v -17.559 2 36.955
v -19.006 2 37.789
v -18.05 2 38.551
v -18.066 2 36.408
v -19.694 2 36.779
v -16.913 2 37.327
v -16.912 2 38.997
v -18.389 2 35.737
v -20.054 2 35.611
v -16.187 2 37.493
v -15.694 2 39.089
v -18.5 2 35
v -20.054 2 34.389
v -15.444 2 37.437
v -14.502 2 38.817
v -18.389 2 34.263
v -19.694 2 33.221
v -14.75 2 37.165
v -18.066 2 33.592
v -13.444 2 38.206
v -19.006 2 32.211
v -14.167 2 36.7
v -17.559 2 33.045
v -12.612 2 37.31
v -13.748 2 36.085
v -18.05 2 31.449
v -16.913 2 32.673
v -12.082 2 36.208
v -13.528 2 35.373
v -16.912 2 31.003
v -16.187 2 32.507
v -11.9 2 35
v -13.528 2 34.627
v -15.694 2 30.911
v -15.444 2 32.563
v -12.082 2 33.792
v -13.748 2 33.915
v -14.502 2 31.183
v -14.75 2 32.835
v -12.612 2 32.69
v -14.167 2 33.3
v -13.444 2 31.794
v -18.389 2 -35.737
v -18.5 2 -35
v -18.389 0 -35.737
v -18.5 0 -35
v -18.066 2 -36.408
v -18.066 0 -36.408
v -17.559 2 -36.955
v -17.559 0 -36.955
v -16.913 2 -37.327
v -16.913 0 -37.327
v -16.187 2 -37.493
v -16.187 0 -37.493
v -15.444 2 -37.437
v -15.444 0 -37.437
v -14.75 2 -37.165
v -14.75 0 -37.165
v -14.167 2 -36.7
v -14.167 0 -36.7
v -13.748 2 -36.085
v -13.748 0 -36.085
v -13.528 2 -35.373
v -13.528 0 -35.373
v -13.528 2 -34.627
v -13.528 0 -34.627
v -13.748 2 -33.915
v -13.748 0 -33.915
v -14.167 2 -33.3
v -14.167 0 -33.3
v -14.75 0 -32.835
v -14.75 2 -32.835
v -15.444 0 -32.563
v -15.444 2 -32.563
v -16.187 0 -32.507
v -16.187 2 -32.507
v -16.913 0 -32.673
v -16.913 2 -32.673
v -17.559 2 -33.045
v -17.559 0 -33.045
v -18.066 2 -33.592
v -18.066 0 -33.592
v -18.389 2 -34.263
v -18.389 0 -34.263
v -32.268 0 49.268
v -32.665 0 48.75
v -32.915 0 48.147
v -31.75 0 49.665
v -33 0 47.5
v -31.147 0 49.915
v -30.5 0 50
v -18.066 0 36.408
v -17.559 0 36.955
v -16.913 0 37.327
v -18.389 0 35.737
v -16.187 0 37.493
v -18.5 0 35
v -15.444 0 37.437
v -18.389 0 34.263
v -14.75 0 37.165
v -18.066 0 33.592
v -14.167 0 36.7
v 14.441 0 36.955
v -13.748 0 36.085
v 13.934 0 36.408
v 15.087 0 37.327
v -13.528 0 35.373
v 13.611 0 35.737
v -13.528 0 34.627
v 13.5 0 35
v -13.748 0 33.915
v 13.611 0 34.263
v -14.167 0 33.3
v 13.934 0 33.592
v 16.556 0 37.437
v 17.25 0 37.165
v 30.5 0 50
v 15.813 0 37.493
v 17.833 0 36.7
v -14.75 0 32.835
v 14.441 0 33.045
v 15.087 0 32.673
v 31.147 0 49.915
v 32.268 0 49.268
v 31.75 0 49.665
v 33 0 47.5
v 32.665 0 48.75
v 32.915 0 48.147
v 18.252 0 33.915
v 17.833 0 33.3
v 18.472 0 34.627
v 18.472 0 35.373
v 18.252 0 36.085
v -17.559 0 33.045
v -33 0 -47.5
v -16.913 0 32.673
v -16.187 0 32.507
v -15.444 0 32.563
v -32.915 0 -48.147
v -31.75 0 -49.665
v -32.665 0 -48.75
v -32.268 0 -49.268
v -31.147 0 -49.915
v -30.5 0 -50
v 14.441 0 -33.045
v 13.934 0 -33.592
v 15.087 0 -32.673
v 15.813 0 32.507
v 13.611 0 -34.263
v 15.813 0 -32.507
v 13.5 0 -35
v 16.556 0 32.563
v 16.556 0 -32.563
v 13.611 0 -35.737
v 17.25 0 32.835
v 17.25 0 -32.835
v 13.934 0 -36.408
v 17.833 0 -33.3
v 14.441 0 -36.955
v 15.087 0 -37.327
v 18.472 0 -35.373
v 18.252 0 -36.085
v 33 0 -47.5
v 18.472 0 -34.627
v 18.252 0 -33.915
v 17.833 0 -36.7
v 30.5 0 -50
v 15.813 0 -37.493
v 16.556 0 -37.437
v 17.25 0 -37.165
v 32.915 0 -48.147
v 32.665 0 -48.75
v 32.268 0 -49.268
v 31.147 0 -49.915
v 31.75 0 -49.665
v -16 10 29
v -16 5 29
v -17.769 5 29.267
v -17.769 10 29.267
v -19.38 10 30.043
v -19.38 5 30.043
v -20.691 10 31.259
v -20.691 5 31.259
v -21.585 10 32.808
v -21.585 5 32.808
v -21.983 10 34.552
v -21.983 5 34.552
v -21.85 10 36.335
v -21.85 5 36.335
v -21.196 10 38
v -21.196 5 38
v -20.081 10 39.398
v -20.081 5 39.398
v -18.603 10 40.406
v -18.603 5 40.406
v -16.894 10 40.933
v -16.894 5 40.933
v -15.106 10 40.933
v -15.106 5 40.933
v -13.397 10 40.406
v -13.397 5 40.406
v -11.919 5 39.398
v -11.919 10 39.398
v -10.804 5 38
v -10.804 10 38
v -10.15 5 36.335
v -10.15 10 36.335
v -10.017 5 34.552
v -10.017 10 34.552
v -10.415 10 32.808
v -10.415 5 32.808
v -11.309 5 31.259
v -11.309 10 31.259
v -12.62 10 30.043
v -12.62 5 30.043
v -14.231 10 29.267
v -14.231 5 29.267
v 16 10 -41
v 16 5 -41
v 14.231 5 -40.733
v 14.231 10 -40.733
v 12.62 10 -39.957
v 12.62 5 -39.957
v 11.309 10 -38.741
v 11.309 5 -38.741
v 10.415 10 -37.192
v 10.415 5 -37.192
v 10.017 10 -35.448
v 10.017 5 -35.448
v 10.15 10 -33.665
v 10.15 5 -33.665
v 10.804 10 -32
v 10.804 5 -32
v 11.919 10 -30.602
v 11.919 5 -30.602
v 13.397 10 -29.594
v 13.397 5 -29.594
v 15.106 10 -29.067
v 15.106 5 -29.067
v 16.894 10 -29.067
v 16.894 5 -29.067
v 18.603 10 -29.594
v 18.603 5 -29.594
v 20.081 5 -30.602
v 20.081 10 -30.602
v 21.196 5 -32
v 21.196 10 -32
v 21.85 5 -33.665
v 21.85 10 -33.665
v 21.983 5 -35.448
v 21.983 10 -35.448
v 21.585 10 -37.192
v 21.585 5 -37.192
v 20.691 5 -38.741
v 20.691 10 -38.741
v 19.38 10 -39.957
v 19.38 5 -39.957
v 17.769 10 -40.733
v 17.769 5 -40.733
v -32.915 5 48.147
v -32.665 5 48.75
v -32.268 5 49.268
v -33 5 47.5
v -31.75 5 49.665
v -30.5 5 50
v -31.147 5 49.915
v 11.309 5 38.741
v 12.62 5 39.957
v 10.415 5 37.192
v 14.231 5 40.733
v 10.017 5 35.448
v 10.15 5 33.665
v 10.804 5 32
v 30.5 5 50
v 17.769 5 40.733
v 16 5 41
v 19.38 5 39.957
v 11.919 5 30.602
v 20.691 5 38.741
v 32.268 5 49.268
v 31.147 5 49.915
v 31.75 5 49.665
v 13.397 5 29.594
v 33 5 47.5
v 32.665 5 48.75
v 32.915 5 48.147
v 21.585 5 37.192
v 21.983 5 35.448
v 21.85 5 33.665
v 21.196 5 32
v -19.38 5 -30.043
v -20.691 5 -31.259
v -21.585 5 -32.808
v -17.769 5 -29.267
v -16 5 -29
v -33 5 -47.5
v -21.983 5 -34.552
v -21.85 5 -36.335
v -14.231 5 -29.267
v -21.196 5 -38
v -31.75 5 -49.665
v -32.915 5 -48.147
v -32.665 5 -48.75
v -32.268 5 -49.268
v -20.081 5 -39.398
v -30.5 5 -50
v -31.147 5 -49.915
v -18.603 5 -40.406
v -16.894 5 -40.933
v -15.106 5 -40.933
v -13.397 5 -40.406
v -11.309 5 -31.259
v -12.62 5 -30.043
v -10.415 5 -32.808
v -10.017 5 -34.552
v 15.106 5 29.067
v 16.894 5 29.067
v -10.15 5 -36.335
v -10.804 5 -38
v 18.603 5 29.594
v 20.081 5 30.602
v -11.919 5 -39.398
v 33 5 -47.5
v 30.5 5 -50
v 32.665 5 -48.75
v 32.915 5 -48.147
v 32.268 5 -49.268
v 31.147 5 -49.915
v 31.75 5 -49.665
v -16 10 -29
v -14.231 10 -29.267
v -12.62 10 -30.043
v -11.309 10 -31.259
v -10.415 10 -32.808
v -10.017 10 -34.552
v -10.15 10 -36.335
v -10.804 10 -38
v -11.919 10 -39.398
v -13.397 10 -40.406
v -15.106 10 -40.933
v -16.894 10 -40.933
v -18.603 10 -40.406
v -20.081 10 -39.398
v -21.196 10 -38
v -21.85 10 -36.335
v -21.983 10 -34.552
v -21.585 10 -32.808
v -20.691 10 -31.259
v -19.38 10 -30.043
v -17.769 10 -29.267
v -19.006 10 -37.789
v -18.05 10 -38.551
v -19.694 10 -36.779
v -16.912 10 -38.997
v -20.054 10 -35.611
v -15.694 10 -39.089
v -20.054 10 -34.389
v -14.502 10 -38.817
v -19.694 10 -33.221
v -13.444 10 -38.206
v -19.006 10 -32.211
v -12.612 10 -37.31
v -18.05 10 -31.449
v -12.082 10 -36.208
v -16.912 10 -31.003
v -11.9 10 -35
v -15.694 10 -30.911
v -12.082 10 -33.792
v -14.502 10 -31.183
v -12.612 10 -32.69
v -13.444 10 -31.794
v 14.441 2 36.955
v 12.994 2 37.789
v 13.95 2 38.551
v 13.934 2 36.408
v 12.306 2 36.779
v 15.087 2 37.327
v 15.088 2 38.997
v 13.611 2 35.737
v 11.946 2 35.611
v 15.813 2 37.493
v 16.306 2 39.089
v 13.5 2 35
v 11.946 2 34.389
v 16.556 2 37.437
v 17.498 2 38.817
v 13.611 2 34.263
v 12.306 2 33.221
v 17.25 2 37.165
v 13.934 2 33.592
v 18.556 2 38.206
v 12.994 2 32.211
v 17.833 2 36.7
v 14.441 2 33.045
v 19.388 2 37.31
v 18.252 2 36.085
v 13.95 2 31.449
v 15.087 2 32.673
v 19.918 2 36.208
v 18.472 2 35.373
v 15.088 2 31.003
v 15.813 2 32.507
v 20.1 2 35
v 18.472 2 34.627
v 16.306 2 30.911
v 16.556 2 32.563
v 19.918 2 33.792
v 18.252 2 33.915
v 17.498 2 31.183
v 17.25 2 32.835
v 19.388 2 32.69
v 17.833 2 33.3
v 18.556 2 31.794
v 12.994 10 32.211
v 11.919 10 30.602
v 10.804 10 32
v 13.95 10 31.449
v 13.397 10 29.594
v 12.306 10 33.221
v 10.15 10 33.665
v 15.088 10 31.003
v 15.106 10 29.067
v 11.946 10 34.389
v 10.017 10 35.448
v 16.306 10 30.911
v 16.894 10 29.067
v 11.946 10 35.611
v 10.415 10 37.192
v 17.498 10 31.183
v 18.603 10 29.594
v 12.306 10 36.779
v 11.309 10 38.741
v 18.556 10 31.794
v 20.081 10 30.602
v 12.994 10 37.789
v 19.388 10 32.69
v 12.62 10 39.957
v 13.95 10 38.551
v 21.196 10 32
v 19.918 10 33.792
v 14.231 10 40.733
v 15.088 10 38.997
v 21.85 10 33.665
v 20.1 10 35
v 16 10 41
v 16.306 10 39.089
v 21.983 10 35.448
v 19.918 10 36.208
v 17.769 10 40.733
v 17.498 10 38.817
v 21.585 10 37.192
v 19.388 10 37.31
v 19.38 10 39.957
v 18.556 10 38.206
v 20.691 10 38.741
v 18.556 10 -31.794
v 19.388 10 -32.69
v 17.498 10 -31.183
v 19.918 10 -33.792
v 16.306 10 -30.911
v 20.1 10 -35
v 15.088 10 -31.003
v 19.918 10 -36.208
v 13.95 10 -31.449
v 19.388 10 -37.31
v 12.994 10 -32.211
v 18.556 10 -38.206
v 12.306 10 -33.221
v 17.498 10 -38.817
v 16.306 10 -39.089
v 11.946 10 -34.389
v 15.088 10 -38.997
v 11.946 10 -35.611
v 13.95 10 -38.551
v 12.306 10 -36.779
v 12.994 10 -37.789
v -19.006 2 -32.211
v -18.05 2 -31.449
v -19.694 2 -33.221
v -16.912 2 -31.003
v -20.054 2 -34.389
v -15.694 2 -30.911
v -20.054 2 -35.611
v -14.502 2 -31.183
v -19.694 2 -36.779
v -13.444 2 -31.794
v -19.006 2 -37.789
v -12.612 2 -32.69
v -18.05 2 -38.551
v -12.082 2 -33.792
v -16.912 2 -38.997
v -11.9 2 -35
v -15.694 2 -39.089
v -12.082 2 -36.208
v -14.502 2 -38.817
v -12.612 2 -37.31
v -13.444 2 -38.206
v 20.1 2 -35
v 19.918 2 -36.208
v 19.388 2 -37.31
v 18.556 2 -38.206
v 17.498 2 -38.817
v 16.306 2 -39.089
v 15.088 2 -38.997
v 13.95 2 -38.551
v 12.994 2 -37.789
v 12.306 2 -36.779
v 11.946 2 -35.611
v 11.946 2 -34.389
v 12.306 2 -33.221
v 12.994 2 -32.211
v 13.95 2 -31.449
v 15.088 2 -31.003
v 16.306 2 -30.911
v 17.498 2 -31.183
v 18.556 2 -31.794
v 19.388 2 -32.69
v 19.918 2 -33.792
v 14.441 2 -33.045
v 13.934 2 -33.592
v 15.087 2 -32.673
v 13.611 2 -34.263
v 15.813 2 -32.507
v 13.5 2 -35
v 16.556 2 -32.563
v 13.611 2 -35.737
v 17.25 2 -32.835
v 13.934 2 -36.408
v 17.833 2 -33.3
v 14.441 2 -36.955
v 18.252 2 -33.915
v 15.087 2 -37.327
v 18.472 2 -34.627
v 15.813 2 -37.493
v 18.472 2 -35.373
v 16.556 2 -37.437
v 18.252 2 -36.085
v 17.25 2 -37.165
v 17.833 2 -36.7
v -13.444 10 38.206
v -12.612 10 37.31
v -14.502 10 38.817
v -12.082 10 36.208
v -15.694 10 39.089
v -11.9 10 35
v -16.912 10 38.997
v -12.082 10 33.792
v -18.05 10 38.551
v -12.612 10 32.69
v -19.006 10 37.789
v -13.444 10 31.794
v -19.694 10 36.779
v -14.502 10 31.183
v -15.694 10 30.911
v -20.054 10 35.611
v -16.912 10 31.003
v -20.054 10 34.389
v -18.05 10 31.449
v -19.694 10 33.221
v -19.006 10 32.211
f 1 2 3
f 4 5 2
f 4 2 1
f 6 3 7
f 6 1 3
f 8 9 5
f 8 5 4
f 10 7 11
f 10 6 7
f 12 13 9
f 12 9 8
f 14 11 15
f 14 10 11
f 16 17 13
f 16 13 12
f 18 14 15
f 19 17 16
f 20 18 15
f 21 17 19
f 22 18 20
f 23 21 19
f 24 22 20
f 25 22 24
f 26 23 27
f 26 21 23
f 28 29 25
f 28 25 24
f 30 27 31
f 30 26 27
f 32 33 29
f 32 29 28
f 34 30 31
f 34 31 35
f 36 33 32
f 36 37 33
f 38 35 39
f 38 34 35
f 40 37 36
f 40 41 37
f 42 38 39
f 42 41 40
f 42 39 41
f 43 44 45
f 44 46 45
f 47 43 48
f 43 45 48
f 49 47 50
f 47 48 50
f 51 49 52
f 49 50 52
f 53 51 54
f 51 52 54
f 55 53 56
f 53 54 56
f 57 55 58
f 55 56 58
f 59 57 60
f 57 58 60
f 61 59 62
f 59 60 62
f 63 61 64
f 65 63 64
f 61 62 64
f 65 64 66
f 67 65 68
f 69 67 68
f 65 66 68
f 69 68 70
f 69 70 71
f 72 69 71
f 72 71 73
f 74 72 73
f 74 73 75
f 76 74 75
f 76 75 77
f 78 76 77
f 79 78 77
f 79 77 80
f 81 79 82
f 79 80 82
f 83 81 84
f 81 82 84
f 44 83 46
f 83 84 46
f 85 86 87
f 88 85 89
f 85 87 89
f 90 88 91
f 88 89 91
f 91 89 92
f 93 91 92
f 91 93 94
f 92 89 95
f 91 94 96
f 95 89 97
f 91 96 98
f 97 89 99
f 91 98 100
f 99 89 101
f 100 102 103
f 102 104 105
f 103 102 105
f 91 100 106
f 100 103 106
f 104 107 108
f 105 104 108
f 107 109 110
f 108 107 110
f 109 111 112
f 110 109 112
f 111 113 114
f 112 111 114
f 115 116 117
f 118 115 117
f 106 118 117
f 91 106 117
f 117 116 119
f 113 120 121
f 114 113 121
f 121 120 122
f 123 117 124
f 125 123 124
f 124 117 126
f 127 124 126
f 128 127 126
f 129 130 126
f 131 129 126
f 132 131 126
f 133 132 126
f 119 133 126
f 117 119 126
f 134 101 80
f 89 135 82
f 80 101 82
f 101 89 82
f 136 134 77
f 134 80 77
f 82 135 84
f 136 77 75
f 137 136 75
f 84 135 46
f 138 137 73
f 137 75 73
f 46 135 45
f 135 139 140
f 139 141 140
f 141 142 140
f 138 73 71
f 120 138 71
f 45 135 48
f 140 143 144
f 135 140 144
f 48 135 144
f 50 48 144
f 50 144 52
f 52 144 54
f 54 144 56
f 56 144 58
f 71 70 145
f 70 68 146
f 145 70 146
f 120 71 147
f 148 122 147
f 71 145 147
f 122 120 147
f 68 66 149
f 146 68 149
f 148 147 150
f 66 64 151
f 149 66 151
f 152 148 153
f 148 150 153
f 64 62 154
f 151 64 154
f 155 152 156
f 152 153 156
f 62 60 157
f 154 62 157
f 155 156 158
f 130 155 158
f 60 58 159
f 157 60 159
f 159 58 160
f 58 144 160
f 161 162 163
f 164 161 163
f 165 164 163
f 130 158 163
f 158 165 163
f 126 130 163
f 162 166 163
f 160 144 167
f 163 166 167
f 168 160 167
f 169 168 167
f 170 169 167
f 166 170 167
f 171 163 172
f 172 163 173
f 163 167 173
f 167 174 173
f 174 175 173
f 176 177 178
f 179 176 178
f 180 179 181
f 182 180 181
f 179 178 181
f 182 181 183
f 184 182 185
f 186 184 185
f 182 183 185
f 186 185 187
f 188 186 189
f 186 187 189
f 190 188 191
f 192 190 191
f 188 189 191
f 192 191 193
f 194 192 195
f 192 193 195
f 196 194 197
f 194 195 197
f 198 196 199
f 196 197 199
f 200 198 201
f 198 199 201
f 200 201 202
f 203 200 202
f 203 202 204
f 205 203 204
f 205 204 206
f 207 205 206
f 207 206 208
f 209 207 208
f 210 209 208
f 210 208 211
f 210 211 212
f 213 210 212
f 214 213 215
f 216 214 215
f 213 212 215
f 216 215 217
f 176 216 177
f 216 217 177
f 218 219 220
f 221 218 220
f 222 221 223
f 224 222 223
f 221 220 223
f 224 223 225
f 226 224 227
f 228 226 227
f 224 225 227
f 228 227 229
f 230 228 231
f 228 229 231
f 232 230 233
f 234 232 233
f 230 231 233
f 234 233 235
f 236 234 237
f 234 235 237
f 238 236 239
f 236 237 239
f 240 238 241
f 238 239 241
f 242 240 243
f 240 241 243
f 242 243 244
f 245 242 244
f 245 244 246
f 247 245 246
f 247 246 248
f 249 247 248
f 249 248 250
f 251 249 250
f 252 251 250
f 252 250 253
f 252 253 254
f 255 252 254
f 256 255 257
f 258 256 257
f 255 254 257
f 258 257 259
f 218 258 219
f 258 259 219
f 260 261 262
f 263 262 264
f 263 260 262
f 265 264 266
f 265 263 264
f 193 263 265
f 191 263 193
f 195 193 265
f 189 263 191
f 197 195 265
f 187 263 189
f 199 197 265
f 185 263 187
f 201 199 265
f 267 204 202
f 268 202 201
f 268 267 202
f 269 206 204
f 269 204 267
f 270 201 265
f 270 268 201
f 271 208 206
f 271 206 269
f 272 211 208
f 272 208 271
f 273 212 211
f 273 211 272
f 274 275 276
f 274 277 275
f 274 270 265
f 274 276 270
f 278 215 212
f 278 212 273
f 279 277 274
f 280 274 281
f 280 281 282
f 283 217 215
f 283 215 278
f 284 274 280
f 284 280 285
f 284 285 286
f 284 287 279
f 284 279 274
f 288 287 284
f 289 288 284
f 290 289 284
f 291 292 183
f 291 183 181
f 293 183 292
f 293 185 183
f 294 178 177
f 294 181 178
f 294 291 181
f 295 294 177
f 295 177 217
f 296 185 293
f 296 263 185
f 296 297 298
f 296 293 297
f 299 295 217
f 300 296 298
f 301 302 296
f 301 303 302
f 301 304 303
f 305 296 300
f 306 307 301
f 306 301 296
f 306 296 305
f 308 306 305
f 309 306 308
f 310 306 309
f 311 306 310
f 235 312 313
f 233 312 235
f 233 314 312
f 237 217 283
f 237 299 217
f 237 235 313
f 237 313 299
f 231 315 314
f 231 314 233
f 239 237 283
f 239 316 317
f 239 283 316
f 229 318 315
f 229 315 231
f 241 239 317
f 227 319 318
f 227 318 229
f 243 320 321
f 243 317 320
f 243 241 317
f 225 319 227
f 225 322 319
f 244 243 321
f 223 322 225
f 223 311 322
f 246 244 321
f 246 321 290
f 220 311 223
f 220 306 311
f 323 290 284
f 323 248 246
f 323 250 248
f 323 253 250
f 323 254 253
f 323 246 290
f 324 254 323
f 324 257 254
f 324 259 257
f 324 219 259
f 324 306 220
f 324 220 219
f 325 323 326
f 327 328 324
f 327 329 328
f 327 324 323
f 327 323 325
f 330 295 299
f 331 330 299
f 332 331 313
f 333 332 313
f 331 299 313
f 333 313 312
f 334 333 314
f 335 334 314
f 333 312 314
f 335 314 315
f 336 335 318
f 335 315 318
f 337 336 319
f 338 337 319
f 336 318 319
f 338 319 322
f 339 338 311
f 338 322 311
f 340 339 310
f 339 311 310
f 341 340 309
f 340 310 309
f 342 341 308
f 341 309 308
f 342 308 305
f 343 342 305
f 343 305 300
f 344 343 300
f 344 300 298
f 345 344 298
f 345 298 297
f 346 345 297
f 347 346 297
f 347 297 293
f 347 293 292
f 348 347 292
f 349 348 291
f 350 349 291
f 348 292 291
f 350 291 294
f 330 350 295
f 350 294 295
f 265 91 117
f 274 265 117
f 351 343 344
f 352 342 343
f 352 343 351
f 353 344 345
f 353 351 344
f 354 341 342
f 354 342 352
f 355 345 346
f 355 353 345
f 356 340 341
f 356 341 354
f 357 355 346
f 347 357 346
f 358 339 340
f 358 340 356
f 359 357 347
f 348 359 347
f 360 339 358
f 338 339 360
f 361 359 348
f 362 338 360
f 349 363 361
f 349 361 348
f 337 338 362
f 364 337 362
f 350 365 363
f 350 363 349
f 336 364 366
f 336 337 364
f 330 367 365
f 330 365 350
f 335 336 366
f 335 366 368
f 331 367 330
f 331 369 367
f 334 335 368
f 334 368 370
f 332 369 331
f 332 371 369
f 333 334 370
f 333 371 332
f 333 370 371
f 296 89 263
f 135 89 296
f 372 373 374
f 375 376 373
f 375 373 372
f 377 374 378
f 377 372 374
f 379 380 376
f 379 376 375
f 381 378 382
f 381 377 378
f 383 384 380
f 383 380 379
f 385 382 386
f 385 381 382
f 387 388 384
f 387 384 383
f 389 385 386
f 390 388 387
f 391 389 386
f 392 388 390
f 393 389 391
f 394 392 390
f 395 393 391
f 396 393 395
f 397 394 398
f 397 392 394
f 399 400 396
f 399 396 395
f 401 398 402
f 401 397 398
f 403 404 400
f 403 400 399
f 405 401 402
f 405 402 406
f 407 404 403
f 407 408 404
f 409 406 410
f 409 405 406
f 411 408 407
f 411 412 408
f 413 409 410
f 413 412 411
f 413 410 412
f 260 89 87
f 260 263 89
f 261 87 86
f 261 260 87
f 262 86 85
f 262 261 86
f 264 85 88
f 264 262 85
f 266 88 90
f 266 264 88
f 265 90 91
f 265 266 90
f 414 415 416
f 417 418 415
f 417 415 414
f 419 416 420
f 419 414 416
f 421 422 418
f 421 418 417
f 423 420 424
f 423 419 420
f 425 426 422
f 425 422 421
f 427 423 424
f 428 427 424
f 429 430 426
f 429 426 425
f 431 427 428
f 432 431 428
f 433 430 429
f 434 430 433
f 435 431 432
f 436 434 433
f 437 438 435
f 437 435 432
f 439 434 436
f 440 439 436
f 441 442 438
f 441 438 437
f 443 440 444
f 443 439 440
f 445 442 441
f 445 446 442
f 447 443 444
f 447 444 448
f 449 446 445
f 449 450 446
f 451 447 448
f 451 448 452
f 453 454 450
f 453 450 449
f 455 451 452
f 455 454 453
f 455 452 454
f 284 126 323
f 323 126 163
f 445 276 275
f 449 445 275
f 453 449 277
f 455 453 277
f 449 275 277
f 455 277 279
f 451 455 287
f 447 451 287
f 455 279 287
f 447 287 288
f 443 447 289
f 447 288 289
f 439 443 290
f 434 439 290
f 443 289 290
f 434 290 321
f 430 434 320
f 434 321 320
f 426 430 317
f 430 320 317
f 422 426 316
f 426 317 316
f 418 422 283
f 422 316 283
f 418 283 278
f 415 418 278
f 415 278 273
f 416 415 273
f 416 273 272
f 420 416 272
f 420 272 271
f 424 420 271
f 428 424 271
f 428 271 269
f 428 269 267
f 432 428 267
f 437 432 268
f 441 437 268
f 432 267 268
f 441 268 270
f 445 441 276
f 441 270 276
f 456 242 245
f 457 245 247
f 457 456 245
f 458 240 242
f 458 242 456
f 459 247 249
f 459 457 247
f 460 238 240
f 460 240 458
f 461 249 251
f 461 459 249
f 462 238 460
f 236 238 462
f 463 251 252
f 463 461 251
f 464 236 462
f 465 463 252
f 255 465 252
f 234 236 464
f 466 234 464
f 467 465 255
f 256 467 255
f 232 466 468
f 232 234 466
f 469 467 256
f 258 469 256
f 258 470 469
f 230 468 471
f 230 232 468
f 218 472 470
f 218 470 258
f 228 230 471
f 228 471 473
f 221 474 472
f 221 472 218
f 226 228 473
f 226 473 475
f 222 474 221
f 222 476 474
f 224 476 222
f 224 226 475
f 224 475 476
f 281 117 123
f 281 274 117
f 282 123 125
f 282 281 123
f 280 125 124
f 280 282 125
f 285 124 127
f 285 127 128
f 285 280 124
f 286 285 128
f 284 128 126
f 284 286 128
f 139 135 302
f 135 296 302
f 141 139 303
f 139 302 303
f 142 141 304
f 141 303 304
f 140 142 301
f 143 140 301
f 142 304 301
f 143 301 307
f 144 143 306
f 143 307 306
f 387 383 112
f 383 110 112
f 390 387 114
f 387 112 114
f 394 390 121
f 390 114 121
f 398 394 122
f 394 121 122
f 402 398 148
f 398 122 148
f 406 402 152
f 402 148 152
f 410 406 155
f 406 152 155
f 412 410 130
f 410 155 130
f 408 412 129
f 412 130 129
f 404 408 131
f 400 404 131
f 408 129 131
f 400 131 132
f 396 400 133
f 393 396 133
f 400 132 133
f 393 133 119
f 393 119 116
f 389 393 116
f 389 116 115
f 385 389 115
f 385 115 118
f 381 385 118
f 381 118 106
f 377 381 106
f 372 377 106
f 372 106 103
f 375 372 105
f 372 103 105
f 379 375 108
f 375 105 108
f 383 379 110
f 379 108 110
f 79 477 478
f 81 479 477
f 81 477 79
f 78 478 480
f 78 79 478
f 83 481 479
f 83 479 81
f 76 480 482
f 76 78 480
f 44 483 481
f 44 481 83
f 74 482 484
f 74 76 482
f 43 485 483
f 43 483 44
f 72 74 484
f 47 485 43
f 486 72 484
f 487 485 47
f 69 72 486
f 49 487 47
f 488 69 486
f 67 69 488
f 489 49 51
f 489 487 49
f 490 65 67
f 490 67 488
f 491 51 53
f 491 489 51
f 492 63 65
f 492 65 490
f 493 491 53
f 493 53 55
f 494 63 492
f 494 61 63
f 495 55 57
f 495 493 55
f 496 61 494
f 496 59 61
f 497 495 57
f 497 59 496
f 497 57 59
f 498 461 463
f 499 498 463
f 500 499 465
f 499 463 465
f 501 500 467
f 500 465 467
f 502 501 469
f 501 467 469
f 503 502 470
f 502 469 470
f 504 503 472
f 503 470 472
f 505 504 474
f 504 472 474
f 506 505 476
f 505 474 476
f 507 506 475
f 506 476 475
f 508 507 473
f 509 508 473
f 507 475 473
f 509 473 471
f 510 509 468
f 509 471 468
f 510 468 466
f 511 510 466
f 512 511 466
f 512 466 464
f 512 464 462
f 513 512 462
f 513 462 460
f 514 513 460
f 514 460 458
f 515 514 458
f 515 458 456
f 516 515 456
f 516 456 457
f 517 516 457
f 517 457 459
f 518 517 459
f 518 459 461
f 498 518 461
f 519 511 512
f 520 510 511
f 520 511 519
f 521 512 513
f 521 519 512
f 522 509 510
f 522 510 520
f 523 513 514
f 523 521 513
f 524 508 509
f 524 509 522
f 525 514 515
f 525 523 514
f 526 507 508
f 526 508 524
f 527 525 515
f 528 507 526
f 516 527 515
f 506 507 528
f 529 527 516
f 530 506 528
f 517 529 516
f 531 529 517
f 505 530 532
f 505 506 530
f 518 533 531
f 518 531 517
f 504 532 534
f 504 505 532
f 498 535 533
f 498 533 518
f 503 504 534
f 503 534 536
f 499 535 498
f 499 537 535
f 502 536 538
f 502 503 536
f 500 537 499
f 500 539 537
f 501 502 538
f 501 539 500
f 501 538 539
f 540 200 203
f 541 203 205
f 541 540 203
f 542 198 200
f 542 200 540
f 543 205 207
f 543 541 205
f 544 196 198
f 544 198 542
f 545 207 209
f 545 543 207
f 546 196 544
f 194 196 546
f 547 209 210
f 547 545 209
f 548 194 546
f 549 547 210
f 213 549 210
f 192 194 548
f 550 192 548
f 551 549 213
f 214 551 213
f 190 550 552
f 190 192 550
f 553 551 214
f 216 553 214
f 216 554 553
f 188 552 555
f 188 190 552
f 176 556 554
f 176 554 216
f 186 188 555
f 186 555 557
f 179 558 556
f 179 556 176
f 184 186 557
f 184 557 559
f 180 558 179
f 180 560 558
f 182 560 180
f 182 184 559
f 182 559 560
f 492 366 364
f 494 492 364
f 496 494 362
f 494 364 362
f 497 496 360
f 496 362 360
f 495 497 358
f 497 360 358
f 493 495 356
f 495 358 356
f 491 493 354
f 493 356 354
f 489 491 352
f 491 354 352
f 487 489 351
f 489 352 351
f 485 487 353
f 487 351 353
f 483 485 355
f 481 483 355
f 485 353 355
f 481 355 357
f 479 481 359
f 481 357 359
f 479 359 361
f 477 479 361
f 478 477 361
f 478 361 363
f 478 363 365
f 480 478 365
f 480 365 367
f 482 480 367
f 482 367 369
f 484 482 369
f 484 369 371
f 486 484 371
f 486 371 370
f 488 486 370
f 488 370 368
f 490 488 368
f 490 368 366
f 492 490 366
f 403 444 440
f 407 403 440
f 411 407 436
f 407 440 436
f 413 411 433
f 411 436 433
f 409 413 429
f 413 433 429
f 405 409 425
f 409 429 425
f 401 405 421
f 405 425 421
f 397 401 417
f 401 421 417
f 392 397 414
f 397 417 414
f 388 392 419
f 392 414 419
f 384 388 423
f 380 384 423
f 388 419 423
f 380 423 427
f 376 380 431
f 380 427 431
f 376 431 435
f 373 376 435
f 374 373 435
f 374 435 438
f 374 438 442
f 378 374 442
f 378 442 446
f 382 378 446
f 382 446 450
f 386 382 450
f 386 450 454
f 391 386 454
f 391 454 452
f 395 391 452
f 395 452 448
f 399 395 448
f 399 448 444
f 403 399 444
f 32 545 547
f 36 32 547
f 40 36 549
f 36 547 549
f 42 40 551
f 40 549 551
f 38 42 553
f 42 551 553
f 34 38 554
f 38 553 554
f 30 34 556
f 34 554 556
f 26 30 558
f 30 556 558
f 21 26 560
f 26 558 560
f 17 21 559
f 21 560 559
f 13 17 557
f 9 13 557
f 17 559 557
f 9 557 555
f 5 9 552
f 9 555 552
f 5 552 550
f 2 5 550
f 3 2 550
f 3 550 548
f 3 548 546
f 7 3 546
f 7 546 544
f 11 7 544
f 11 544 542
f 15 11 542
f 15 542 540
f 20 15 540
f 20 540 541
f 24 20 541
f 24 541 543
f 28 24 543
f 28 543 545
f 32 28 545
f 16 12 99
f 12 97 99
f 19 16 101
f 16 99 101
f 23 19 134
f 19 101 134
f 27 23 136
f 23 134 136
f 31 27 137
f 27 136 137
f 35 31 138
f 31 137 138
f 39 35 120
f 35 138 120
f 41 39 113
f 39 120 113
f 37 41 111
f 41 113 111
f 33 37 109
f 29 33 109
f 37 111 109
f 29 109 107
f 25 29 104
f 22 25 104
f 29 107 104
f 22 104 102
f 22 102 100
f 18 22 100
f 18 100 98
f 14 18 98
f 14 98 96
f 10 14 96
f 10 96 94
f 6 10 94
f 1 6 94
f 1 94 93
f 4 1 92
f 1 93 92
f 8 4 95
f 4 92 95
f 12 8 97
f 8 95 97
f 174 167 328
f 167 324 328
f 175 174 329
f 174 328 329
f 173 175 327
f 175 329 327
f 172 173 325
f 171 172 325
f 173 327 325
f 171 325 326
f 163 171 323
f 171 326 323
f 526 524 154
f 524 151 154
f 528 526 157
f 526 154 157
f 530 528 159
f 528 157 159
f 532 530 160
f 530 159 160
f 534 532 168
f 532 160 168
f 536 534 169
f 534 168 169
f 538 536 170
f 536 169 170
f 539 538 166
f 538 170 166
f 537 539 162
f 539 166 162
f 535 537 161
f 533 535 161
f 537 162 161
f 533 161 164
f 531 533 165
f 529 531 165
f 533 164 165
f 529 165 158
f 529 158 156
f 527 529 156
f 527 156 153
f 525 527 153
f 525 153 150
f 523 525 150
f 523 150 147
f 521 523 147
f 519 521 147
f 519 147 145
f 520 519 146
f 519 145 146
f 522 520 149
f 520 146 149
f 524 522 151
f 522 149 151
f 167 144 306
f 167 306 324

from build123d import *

# Parameters (mm, degrees)
SKETCH1_W                               = 66
SKETCH1_H                               = 100
BOSS_EXTRUDE1_DEPTH                     = 5
SKETCH2_R                               = 6
BOSS_EXTRUDE2_DEPTH                     = 5
CBORE_FOR_M5_HEX_HEAD_BOLT1_D           = 5
CBORE_FOR_M5_HEX_HEAD_BOLT1_CBORE_D     = 8.2
CBORE_FOR_M5_HEX_HEAD_BOLT1_CBORE_DEPTH = 8
FILLET1_R                               = 2.5


with BuildPart() as part:
    # Sketch1 → Boss-Extrude1 (new body)
    with BuildSketch(Plane(origin=(0, 0, 0), x_dir=(1, 0, 0), z_dir=(0, 1, 0))):
        Rectangle(SKETCH1_W, SKETCH1_H)
    extrude(amount=BOSS_EXTRUDE1_DEPTH)

    # Sketch2 → Boss-Extrude2 (add)
    with BuildSketch(Plane(origin=(0, 5, 0), x_dir=(1, 0, 0), z_dir=(0, 1, 0))):
        with Locations(Location((-16, 35, 0), (0, 0, 270))):
            Circle(SKETCH2_R)
        with Locations(Location((16, 35, 0), (0, 0, 90))):
            Circle(SKETCH2_R)
        with Locations(Location((16, -35, 0), (0, 0, 270))):
            Circle(SKETCH2_R)
        with Locations(Location((-16, -35, 0), (0, 0, 90))):
            Circle(SKETCH2_R)
    extrude(amount=BOSS_EXTRUDE2_DEPTH)

    # CBORE for M5 Hex Head Bolt1 (through all)
    with Locations(Plane(origin=(0, 10, 0), x_dir=(1, 0, 0), z_dir=(0, 1, 0))):
        with Locations((-16, 35), (16, 35), (16, -35), (-16, -35)):
            CounterBoreHole(CBORE_FOR_M5_HEX_HEAD_BOLT1_D / 2, CBORE_FOR_M5_HEX_HEAD_BOLT1_CBORE_D / 2, CBORE_FOR_M5_HEX_HEAD_BOLT1_CBORE_DEPTH)

    # Fillet1
    fillet1_edges = [part.edges().sort_by_distance(p)[0] for p in [
        (-33, 2.5, -50),
        (33, 2.5, -50),
        (33, 2.5, 50),
        (-33, 2.5, 50),
    ]]
    fillet(fillet1_edges, radius=FILLET1_R)


solid = part.part
